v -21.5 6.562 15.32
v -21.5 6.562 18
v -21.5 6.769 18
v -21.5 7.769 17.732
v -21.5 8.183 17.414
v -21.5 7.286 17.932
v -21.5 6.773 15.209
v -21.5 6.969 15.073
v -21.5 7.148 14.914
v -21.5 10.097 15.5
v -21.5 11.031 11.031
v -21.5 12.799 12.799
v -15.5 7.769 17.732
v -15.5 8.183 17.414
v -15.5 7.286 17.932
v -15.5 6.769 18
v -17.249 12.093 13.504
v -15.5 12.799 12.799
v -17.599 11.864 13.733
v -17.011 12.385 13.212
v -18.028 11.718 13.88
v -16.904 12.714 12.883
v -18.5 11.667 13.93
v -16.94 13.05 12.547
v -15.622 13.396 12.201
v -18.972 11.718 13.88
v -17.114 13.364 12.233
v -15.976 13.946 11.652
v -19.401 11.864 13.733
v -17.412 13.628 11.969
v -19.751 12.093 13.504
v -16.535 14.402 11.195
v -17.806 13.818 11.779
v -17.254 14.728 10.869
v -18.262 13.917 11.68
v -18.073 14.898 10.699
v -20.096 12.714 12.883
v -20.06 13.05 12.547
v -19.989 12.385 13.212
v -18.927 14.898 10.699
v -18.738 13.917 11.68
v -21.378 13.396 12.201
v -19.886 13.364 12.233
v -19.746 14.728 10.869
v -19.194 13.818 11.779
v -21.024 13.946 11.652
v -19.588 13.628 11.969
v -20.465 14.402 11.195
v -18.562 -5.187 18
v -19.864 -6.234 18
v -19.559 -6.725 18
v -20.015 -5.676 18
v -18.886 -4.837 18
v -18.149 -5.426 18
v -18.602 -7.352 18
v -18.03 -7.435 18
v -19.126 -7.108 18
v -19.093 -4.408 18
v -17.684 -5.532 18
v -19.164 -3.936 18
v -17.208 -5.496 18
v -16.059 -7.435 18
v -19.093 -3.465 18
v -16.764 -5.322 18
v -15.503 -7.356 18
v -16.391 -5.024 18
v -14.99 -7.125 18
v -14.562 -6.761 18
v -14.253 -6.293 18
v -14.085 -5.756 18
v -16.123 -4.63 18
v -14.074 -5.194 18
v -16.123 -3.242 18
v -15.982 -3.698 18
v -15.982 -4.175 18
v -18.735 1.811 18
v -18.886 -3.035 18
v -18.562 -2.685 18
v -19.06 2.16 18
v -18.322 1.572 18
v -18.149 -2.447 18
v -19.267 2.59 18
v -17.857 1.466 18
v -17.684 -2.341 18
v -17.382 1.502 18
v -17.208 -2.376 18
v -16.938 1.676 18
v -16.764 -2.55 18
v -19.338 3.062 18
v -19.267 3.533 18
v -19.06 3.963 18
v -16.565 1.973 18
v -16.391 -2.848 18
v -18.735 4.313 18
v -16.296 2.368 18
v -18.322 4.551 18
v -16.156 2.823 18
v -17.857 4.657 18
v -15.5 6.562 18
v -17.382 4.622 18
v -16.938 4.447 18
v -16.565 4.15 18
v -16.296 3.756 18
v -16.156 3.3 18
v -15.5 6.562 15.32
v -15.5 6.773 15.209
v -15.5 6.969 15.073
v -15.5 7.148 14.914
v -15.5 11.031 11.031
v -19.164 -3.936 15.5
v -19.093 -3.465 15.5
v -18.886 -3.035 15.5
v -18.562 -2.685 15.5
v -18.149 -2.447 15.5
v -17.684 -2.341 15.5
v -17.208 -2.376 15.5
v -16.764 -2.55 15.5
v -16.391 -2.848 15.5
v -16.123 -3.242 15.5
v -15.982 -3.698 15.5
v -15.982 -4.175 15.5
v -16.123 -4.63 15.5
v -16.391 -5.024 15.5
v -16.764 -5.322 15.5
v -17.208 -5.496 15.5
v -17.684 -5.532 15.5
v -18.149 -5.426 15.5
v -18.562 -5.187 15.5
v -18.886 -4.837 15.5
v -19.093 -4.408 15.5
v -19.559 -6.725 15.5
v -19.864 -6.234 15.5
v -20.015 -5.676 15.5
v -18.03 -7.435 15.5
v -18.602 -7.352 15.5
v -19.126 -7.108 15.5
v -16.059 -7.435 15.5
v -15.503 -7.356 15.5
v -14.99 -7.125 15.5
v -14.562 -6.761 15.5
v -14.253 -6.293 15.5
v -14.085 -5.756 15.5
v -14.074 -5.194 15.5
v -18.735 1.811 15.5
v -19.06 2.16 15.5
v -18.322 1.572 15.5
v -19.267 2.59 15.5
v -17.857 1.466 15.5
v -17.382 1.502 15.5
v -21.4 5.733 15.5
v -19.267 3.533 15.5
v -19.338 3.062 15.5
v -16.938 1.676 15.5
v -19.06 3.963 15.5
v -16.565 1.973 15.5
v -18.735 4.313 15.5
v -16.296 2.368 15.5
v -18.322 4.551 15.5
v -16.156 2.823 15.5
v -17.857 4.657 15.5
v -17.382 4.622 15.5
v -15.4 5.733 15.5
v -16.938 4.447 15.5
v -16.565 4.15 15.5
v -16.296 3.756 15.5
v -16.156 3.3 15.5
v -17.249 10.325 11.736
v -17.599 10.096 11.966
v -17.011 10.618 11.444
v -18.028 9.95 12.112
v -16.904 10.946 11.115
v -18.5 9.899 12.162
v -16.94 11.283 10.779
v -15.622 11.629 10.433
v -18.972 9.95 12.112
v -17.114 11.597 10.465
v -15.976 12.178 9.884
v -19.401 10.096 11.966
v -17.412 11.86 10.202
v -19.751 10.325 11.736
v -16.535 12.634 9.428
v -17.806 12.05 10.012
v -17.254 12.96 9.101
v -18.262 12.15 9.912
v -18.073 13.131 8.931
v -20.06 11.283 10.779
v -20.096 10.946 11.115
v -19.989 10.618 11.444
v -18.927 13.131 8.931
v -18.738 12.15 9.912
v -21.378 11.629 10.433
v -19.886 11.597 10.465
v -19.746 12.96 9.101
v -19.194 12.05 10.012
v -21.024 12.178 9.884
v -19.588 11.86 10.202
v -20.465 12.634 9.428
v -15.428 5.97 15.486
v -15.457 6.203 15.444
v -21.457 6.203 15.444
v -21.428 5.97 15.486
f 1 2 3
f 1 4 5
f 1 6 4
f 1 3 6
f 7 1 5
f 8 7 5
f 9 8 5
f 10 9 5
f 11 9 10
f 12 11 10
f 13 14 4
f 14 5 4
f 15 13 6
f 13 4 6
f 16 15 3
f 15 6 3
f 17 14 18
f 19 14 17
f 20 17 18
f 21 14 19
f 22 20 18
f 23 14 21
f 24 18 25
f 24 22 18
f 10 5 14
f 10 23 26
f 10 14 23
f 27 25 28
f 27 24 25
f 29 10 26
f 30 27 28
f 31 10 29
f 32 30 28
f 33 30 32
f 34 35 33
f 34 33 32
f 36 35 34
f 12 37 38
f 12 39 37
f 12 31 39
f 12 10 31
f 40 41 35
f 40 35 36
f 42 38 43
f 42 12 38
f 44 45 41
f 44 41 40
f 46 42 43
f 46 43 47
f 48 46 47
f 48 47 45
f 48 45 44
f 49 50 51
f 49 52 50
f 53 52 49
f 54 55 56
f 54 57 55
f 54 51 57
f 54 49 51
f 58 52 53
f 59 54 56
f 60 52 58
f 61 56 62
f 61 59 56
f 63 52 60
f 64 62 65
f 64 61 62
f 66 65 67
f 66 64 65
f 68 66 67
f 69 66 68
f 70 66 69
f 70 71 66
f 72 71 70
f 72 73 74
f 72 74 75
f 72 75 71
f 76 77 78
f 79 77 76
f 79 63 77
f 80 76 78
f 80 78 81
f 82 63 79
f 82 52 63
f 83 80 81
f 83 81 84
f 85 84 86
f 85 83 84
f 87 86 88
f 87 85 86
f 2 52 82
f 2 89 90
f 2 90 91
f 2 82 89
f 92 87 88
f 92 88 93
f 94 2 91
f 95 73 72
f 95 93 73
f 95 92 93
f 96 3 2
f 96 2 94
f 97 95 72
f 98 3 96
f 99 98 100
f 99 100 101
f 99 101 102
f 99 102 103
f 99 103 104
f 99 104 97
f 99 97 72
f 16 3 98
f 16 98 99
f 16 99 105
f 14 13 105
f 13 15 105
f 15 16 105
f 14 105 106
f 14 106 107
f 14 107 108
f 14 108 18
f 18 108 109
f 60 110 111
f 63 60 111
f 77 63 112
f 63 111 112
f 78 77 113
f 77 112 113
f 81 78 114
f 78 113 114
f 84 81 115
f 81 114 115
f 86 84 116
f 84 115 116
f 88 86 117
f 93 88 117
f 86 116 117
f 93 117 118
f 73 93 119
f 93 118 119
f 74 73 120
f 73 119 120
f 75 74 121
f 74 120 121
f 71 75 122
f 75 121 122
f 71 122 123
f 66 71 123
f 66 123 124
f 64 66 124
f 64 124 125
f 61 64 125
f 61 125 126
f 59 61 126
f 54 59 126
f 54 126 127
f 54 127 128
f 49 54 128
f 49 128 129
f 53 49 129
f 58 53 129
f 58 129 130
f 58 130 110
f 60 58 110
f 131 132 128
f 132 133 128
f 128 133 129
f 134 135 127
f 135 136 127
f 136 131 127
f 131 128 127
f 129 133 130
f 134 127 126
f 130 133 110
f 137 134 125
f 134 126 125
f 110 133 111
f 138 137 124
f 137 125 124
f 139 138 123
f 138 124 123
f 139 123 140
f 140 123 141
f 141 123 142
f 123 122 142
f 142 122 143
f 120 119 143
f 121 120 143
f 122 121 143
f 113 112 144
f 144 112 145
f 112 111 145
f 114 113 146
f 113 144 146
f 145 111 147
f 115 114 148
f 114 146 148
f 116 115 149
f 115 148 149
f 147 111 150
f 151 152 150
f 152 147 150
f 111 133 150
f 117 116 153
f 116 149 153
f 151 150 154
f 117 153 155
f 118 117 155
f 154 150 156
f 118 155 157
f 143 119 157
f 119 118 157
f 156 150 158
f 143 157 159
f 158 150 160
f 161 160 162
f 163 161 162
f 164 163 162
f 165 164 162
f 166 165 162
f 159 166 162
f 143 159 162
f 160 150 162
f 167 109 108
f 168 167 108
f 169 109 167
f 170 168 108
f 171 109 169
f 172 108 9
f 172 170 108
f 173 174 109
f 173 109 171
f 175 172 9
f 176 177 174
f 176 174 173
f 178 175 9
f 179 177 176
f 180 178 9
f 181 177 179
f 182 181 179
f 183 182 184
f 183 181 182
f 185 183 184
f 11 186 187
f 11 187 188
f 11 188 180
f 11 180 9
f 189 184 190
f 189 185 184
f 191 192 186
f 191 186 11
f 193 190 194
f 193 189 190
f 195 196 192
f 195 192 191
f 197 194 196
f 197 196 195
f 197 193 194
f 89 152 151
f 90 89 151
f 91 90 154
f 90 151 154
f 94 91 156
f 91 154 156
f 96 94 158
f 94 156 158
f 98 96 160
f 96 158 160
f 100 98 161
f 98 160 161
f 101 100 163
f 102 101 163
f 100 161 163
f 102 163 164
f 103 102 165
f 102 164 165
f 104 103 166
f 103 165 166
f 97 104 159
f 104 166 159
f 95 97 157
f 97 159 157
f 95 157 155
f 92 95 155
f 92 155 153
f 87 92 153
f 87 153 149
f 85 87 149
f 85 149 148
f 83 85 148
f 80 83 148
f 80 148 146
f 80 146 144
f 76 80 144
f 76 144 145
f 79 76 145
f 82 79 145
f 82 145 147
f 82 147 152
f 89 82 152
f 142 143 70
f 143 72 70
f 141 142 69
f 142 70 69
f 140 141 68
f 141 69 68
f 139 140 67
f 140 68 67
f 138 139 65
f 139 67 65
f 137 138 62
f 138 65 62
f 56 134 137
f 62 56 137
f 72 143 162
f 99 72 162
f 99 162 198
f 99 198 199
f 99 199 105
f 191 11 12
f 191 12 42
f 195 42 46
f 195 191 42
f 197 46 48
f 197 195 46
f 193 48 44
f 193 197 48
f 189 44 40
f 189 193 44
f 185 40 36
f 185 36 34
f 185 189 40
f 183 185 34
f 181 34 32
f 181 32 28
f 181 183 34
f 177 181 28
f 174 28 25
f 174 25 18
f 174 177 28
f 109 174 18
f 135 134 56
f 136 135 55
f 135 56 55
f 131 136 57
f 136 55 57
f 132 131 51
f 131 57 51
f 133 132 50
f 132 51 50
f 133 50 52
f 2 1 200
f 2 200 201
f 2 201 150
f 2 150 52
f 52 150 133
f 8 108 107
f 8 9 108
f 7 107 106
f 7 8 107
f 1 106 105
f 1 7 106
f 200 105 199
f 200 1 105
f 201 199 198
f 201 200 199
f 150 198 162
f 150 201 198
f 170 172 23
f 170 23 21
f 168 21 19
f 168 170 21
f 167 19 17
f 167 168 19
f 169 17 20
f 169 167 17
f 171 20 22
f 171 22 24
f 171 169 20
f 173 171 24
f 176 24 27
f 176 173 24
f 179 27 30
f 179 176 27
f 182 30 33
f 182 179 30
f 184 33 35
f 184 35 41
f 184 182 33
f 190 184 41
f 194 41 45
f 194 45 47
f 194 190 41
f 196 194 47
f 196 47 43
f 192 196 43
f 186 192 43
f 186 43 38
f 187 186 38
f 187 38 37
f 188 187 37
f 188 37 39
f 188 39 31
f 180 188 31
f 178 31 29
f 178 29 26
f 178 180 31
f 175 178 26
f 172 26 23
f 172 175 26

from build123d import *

# Parameters (mm, degrees)
SKETCH_4_R           = 4.196960071
EXTRUDE_3_DEPTH      = 0.6
EXTRUDE_START        = 0.6
SKETCH_5_R           = 4.196960071
EXTRUDE_4_DEPTH      = 0.6
SKETCH_8_R           = 1.6
EXTRUDE_6_DEPTH      = 2.5
SKETCH_9_R           = 27.5
EXTRUDE_7_DEPTH      = 2.5
SKETCH_10_W          = 6
SKETCH_10_H          = 20
CUT_EXTRUDE_1_DEPTH  = 49.812552895
CUT_EXTRUDE_8_DEPTH  = 49.812552895
CUT_EXTRUDE_9_DEPTH  = 6
CUT_EXTRUDE_START    = -31.2
SKETCH_19_R          = 4.196960071
CUT_EXTRUDE_10_DEPTH = 31.2
SKETCH_20_R          = 1.6
CUT_EXTRUDE_11_DEPTH = 40.445330411
FILLET_1_R           = 2


with BuildPart() as part:
    # ｽｹｯﾁ1 → 回転1 (revolve)
    with BuildSketch(Plane(origin=(0, 0, 0), x_dir=(1, 0, 0), z_dir=(0, -0.7071067811865488, 0.7071067811865464)), mode=Mode.PRIVATE) as revolve_1_sk:
        with BuildLine():
            Line((-22.696960071, 15), (-18.5, 15))
            Line((-18.5, 15), (-18.5, -15))
            Line((-18.5, -15), (-22.696960071, -15))
            ThreePointArc((-22.696960071, -15), (-25, 0), (-22.696960071, 15))
        make_face()
    revolve(revolve_1_sk.sketch.rotate(Axis((-18.5, 17.67766953, 17.67766953), (0, -0.7071067811865462, -0.7071067811865488)), 270), axis=Axis((-18.5, 17.67766953, 17.67766953), (0, -0.7071067811865462, -0.7071067811865488)))

    # ｽｹｯﾁ4 → ﾎﾞｽ - 押し出し3 (add)
    with BuildSketch(Plane(origin=(0, -10.606601718, -10.606601718), x_dir=(1, 0, 0), z_dir=(0, -0.7071067811865462, -0.7071067811865488))):
        with Locations(Location((-18.5, 0, 0), (0, 0, 90))):
            Circle(SKETCH_4_R)
    extrude(amount=EXTRUDE_3_DEPTH)

    # ｽｹｯﾁ5 → ﾎﾞｽ - 押し出し4 (add)
    with BuildSketch(Plane(origin=(0, 10.606601718, 10.606601718), x_dir=(1, 0, 0), z_dir=(0, 0.7071067811865462, 0.7071067811865488)).offset(EXTRUDE_START)):
        with Locations(Location((-18.5, 0, 0), (0, 0, 270))):
            Circle(SKETCH_5_R)
    extrude(amount=-EXTRUDE_4_DEPTH)

    # ｽｹｯﾁ8 → ﾎﾞｽ - 押し出し6 (add)
    with BuildSketch(Plane(origin=(0, 11.030865787, 11.030865787), x_dir=(1, 0, 0), z_dir=(0, 0.7071067811865462, 0.7071067811865488))):
        with BuildLine():
            Line((-15.5, -9.999999662), (-21.5, -9.999999662))
            Line((-21.5, -9.999999662), (-21.5, 3.38e-07))
            ThreePointArc((-21.5, 3.38e-07), (-18.5, 3), (-15.5, 3.38e-07))
            Line((-15.5, 3.38e-07), (-15.5, -9.999999662))
        make_face()
        with Locations(Location((-18.5, 0, 0), (0, 0, 270))):
            Circle(SKETCH_8_R, mode=Mode.SUBTRACT)
    extrude(amount=EXTRUDE_6_DEPTH)

    # ｽｹｯﾁ9 → ﾎﾞｽ - 押し出し7 (add)
    with BuildSketch(Plane.XY.offset(18)):
        Circle(SKETCH_9_R)
    extrude(amount=-EXTRUDE_7_DEPTH)

    # ｽｹｯﾁ10 → ｶｯﾄ - 押し出し1 (cut, through all)
    with BuildSketch(Plane(origin=(0, 0, 15.5), x_dir=(-1, 0, 0), z_dir=(0, 0, -1))):
        with Locations((24.5, 0.097265479)):
            Rectangle(SKETCH_10_W, SKETCH_10_H)
    extrude(amount=-CUT_EXTRUDE_1_DEPTH, mode=Mode.SUBTRACT)

    # ｽｹｯﾁ16 → ｶｯﾄ - 押し出し8 (cut, through all)
    with BuildSketch(Plane(origin=(0, 0, 15.5), x_dir=(-1, 0, 0), z_dir=(0, 0, -1))):
        with BuildLine():
            Line((25.579195254, 10.097265479), (15.5, 10.097265479))
            Line((15.5, 10.097265479), (15.5, 22.715633383))
            ThreePointArc((15.5, 22.715633383), (21.486760408, 17.163016261), (25.579195254, 10.097265479))
        make_face()
    extrude(amount=-CUT_EXTRUDE_8_DEPTH, mode=Mode.SUBTRACT)

    # ｽｹｯﾁ17 → ｶｯﾄ - 押し出し9 (cut)
    with BuildSketch(Plane.ZY.offset(21.5)):
        Polygon((15.5, 10.097265479), (18, 10.097265479), (19.869700312, 5.727565167), (18.101933359, 3.959798214), (18, 4.061731573), (18, 7.597265479), align=None)
    extrude(amount=-CUT_EXTRUDE_9_DEPTH, mode=Mode.SUBTRACT)

    # ｽｹｯﾁ19 → ｶｯﾄ - 押し出し10 (cut)
    with BuildSketch(Plane(origin=(0, -11.030865787, -11.030865787), x_dir=(1, 0, 0), z_dir=(0, -0.7071067811865462, -0.7071067811865488)).offset(CUT_EXTRUDE_START)):
        with Locations((-18.5, 0)):
            Circle(SKETCH_19_R)
    extrude(amount=CUT_EXTRUDE_10_DEPTH, mode=Mode.SUBTRACT)


with BuildPart() as body_2:
    # of the pieces the cut leaves, the one that is kept (cut_extrude_10_keep)
    add(part.part.solids().sort_by_distance((-21.5, 6.561731573, 15.5))[0])

    # ｽｹｯﾁ20 → ｶｯﾄ - 押し出し11 (cut, through all)
    with BuildSketch(Plane(origin=(0, 0, 15.5), x_dir=(-1, 0, 0), z_dir=(0, 0, -1))):
        with Locations((17.73769432, 3.061731573)):
            Circle(SKETCH_20_R)
        with Locations((17.564365692, -3.936122183)):
            Circle(SKETCH_20_R)
        with BuildLine():
            Line((21.5, 6.561731573), (19.802086592, -7.435049061))
            Line((19.802086592, -7.435049061), (13.802086592, -7.435049061))
            Line((13.802086592, -7.435049061), (15.5, 6.561731573))
            Line((15.5, 6.561731573), (15.5, 22.715633383))
            ThreePointArc((15.5, 22.715633383), (-26.256917644, -8.174611664), (25.655132995, -9.902734521))
            Line((25.655132995, -9.902734521), (21.5, -9.902734521))
            Line((21.5, -9.902734521), (21.5, 6.561731573))
        make_face()
    extrude(amount=-CUT_EXTRUDE_11_DEPTH, mode=Mode.SUBTRACT)

    # ﾌｨﾚｯﾄ1
    fillet_1_edges = [body_2.edges().sort_by_distance(p)[0] for p in [
        (-18.5, 6.561731573, 15.5),
        (-18.5, 7.597265479, 18),
        (-13.802086592, -7.435049061, 16.75),
        (-19.802086592, -7.435049061, 16.75),
    ]]
    fillet(fillet_1_edges, radius=FILLET_1_R)


solid = body_2.part
